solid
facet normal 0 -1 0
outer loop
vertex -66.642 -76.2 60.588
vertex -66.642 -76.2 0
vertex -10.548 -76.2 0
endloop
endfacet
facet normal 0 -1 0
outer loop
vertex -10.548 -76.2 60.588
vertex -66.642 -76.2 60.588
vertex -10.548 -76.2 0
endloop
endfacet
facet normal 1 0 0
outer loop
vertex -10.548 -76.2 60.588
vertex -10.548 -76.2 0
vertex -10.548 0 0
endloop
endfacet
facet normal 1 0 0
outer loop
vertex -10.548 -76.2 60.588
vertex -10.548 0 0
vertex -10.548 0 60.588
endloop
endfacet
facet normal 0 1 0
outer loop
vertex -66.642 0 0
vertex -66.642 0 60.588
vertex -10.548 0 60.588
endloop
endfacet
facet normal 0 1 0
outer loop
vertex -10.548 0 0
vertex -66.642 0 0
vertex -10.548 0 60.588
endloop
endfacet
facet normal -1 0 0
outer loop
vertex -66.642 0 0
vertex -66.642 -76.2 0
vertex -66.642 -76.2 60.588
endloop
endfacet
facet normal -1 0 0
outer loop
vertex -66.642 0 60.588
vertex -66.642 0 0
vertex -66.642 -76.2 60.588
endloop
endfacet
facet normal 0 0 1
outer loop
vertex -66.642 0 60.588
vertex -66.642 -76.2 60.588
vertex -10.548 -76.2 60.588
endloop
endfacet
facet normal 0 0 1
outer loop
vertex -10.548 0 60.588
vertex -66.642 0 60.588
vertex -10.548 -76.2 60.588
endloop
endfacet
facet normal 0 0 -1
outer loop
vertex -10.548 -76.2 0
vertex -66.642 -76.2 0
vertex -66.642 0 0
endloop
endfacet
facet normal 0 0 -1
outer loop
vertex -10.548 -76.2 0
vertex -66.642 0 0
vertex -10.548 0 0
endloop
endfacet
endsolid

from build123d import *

# Parameters (mm, degrees)
F0_W     = 56.0941062868
F0_H     = 60.5884306133
F1_DEPTH = 76.2
F2_R     = 7.0764642194
F3_DEPTH = 12.7
F4_DEPTH = 12.7


with BuildPart() as f1:
    # F0 (on Front) → F1 (new body)
    with BuildSketch(Plane.XZ):
        with Locations((-38.5946650058, 30.2942153066)):
            Rectangle(F0_W, F0_H)
    extrude(amount=F1_DEPTH)

    # F2 (on face) → F3 (join)
    with BuildSketch(Plane.XZ.offset(76.2)):
        with Locations((-24.6596988291, 47.5771352649)):
            Circle(F2_R)
    extrude(amount=F3_DEPTH)

    # F4 (cut): faces of the model
    f4_faces = [f1.faces().sort_by_distance(p)[0] for p in [
        (-24.6596988291, -88.9, 47.5771352649),
        (-38.5946650058, 0, 30.2942153066),
    ]]
    extrude(f4_faces, amount=-F4_DEPTH, dir=(0, -1, 0), mode=Mode.SUBTRACT)


solid = f1.part
